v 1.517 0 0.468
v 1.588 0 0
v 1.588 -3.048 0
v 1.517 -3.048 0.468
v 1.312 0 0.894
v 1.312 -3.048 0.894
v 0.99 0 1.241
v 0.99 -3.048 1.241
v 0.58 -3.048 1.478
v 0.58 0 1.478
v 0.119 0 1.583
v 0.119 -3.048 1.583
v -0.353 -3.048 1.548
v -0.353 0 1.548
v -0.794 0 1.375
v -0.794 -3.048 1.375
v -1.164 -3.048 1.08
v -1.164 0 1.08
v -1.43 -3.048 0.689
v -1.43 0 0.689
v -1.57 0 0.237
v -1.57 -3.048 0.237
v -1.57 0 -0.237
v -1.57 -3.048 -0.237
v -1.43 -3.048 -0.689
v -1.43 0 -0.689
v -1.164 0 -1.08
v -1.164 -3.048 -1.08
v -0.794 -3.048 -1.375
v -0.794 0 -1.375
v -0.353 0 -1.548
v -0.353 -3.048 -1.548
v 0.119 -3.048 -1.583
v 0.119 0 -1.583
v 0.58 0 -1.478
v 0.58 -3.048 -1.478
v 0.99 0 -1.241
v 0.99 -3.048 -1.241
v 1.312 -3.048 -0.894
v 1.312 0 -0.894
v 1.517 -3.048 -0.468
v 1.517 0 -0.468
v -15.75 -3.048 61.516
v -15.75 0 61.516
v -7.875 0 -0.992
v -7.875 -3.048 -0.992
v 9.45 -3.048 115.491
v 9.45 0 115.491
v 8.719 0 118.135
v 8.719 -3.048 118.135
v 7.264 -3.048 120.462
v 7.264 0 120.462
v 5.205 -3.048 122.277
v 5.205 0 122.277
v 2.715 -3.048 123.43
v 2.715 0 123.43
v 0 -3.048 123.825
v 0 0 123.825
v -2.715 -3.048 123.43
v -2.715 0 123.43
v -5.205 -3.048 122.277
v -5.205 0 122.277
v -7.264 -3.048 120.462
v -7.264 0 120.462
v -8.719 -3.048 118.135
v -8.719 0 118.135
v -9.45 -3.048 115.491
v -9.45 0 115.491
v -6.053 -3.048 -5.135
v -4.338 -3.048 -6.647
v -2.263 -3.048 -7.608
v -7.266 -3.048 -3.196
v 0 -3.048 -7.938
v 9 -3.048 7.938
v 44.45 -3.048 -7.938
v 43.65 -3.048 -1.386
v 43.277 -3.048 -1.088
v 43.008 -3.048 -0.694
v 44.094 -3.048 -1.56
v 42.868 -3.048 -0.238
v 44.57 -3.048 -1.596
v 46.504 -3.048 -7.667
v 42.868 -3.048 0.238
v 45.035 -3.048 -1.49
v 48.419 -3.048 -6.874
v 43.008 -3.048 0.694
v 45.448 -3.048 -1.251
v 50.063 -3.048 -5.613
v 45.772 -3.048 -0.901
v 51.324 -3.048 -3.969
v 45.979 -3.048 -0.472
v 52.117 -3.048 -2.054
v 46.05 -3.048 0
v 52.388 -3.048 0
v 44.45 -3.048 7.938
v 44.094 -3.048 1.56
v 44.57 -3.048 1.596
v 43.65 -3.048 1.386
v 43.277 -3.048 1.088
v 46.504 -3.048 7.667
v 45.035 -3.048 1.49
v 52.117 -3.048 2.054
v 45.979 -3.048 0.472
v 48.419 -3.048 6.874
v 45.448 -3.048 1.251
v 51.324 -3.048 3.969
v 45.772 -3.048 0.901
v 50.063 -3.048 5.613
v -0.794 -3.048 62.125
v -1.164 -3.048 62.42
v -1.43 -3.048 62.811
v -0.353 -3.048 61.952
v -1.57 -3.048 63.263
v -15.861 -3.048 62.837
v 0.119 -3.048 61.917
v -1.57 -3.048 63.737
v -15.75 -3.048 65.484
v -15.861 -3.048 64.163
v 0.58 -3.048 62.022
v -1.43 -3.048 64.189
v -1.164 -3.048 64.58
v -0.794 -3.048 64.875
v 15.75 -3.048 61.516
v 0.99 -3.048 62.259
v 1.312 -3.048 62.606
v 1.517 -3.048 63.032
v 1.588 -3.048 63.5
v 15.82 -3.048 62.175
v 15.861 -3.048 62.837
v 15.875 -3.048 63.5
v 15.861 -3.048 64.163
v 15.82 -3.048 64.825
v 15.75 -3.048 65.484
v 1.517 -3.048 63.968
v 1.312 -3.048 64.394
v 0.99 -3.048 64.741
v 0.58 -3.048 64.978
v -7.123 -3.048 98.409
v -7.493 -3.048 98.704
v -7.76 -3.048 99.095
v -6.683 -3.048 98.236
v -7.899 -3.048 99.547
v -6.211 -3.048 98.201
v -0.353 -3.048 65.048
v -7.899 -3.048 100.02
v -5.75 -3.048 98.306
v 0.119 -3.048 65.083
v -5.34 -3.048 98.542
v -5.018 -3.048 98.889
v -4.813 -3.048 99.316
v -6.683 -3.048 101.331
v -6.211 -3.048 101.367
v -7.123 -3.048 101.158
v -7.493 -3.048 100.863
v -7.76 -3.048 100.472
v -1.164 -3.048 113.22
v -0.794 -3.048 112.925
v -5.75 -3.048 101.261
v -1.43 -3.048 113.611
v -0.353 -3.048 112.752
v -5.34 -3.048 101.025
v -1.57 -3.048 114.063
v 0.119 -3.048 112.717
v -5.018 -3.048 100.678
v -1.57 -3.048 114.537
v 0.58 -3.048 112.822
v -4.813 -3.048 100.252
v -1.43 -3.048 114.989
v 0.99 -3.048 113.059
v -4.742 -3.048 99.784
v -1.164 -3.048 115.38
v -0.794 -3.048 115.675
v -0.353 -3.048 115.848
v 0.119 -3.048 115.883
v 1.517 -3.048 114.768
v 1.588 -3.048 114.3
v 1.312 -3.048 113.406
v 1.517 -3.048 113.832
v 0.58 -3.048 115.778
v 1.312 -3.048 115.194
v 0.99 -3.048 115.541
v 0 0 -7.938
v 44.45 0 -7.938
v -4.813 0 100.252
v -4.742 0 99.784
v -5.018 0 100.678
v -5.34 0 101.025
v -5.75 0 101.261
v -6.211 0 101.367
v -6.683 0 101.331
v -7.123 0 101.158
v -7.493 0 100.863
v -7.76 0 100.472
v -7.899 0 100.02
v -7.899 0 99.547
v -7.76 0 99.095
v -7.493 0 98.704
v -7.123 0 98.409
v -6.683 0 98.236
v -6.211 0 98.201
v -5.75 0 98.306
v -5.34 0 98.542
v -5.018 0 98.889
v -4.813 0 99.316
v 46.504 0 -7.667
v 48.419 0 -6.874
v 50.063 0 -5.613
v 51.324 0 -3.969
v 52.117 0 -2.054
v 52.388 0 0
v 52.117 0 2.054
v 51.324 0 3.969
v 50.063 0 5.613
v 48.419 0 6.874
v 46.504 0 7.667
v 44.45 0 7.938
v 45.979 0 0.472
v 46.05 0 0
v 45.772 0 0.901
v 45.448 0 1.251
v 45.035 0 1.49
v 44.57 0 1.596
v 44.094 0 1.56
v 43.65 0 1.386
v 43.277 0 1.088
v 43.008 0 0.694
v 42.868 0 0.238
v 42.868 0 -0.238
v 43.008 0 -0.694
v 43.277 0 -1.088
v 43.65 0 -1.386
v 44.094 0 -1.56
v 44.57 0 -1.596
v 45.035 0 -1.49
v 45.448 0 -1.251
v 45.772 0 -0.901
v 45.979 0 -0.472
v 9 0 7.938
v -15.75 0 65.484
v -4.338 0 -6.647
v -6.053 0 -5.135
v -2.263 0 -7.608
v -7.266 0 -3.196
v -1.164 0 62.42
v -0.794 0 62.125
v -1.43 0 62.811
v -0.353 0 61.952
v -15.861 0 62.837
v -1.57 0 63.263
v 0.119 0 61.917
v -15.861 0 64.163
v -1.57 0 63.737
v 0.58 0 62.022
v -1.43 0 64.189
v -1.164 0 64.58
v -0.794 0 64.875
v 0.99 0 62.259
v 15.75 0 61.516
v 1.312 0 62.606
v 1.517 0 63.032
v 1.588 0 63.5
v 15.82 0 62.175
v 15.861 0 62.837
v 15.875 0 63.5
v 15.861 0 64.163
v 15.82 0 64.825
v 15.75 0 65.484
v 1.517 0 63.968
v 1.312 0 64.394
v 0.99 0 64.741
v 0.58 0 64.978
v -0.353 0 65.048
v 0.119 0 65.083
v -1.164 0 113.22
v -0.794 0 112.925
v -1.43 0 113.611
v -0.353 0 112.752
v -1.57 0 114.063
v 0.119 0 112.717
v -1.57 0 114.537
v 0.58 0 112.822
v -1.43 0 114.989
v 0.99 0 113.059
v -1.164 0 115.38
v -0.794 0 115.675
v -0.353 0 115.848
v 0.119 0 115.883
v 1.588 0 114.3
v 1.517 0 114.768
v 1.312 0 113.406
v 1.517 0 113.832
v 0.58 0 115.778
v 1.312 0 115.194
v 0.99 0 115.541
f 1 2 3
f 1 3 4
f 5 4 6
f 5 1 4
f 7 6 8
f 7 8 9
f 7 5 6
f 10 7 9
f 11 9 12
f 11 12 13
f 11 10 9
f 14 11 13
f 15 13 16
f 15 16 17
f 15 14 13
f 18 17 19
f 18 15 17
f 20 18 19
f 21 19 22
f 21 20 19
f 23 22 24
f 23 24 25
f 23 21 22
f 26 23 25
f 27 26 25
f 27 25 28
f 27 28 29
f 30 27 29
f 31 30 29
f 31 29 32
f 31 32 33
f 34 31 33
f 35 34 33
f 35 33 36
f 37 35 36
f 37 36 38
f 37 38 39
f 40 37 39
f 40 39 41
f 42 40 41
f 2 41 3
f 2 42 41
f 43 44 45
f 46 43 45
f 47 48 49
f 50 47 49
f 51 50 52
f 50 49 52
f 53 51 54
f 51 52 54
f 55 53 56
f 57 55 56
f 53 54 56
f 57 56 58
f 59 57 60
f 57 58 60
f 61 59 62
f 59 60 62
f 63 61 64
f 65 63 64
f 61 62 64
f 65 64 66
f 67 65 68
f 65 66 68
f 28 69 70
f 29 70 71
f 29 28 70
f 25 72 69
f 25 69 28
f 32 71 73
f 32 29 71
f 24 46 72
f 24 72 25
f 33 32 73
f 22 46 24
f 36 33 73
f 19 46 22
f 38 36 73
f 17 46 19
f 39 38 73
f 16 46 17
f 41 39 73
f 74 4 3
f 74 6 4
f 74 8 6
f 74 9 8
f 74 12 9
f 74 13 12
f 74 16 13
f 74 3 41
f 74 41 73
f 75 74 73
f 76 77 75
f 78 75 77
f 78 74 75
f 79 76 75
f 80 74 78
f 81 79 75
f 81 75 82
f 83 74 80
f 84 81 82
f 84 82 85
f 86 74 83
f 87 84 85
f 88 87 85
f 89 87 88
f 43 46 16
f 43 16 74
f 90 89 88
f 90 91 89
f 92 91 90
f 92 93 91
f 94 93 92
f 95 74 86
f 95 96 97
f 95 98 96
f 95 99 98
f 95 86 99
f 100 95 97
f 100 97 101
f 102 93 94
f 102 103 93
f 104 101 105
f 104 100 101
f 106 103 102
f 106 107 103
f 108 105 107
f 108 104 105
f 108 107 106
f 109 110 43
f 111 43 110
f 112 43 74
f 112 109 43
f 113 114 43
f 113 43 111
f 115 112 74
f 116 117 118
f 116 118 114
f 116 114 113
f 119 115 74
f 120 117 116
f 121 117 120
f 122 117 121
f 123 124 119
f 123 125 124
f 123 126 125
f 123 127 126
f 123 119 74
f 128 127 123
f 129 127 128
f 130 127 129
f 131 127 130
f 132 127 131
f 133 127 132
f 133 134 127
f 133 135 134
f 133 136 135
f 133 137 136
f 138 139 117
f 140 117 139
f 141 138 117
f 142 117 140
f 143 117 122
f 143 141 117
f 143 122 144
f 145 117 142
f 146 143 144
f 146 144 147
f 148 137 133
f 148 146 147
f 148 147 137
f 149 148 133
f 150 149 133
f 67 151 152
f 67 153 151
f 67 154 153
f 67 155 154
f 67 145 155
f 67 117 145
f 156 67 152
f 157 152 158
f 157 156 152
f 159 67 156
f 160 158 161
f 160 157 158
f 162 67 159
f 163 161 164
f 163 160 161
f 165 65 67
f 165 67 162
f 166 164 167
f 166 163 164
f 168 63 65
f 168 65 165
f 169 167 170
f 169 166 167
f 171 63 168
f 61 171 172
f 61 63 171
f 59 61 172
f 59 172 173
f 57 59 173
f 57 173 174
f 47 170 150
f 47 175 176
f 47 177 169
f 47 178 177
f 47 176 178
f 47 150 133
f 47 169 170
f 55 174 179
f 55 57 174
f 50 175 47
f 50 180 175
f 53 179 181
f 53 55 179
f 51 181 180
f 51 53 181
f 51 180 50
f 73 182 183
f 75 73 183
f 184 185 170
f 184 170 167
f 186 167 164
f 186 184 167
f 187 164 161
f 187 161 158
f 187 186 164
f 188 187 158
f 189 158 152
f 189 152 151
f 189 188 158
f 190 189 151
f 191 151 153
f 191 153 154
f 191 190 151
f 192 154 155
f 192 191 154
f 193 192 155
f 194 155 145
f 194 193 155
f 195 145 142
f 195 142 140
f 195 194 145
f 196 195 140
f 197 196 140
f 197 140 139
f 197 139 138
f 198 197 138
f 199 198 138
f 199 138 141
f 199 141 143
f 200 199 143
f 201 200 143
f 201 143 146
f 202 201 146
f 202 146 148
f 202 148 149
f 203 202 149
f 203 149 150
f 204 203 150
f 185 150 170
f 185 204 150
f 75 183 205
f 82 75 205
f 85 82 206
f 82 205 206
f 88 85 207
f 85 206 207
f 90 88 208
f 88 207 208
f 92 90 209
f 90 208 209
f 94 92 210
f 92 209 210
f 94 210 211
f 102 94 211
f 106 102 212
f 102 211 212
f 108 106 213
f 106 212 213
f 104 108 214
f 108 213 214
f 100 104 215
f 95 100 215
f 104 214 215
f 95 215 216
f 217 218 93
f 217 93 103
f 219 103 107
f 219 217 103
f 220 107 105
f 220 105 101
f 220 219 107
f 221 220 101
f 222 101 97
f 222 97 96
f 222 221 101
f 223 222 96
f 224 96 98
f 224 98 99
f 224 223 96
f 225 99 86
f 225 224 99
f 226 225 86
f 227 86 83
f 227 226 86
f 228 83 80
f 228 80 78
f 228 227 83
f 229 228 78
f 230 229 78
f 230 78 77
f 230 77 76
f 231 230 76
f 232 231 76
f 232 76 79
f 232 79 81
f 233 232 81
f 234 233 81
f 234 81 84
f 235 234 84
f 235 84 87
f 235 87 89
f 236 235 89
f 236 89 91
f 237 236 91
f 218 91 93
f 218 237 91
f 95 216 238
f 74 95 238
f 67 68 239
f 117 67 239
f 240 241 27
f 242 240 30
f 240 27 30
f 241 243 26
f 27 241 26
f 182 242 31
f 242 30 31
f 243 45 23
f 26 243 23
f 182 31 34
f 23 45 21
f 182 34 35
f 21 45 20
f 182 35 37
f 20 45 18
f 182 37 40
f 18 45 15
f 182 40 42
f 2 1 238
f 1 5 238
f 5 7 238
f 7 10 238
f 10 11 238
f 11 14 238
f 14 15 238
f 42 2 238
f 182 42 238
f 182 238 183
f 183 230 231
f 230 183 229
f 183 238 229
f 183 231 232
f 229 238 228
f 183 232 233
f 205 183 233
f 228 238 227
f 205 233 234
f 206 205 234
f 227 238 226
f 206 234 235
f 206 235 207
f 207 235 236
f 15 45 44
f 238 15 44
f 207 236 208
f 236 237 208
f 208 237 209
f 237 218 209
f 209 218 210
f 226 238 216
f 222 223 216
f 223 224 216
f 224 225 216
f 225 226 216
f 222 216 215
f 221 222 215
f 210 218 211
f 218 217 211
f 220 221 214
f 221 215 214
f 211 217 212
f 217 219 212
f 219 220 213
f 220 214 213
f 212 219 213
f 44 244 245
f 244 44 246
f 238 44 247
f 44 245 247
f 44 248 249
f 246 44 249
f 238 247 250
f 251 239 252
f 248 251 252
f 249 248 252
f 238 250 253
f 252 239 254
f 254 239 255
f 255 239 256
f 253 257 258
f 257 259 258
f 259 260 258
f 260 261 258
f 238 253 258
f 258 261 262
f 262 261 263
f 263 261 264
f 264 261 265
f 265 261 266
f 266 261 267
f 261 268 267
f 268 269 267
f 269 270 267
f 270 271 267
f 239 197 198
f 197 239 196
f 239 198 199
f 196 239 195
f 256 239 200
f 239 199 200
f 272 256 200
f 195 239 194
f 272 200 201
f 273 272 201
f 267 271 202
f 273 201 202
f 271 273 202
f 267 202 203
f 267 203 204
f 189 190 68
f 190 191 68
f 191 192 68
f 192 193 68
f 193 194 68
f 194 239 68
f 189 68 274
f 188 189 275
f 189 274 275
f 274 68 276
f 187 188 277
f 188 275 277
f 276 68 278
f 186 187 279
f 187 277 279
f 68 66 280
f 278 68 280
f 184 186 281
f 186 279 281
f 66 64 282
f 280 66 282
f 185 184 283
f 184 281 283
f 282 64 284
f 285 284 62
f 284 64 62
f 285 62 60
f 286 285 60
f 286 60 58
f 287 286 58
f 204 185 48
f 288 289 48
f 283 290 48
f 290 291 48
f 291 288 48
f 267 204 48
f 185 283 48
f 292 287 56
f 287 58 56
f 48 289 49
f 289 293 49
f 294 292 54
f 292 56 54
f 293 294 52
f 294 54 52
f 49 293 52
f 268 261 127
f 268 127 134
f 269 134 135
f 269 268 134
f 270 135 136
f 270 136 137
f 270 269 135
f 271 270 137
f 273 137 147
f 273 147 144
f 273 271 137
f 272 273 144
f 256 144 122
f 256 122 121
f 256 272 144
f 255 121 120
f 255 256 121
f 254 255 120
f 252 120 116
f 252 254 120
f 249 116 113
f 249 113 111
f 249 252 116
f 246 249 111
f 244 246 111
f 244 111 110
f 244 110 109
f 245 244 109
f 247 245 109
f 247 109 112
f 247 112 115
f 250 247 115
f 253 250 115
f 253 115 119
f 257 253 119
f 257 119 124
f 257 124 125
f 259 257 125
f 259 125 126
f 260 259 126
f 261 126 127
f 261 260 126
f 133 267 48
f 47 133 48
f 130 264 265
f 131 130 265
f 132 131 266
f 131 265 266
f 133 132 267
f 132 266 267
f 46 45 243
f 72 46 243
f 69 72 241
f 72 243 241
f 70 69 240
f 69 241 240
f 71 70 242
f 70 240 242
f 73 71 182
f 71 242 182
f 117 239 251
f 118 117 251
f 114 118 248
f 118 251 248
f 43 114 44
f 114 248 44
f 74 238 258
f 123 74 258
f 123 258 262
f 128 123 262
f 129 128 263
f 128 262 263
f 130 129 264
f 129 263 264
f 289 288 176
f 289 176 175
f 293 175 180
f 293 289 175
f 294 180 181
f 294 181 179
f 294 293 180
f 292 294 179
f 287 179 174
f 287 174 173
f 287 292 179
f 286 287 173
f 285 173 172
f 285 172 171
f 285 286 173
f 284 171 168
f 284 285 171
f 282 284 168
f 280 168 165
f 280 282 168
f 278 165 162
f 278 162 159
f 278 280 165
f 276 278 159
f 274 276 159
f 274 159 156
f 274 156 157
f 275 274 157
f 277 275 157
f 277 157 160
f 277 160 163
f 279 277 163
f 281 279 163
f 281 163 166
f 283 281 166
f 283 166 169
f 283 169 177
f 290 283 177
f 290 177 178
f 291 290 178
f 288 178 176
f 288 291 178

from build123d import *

# Parameters (mm, degrees)
F0_R     = 1.5875
F0_R_2   = 1.6002
F1_DEPTH = 3.048
F4_DEPTH = 3.048


# Not quite as in the source:
# - a feature of the source that left no trace in its solid (it failed there, or was rolled back) is left out


with BuildPart() as f1:
    # F0 (on Front) → F1 (new body)
    with BuildSketch(Plane.XZ):
        with BuildLine():
            ThreePointArc((-9.4502929642, 115.490625), (-0.596483242, 104.7936951058), (9.525, 114.3))
            ThreePointArc((9.525, 114.3), (9.5063048942, 114.896483242), (9.4502929642, 115.490625))
            ThreePointArc((9.4502929642, 115.490625), (0, 123.825), (-9.4502929642, 115.490625))
        make_face()
        with Locations((0, 114.3)):
            Circle(F0_R, mode=Mode.SUBTRACT)
        with BuildLine():
            ThreePointArc((9.4502929642, 115.490625), (9.5063048942, 114.896483242), (9.525, 114.3))
            ThreePointArc((9.525, 114.3), (-0.596483242, 104.7936951058), (-9.4502929642, 115.490625))
            Line((-9.4502929642, 115.490625), (-15.7504882737, 65.484375))
            ThreePointArc((-15.7504882737, 65.484375), (0, 79.375), (15.7504882737, 65.484375))
            Line((15.7504882737, 65.484375), (9.4502929642, 115.490625))
        make_face()
        with Locations((-6.3295518048, 99.7836068273)):
            Circle(F0_R, mode=Mode.SUBTRACT)
        with BuildLine():
            ThreePointArc((15.875, 63.5), (15.8438414904, 64.4941387366), (15.7504882737, 65.484375))
            ThreePointArc((15.7504882737, 65.484375), (0, 79.375), (-15.7504882737, 65.484375))
            ThreePointArc((-15.7504882737, 65.484375), (-15.875, 63.5), (-15.7504882737, 61.515625))
            ThreePointArc((-15.7504882737, 61.515625), (0, 47.625), (15.7504882737, 61.515625))
            ThreePointArc((15.7504882737, 61.515625), (15.8438414904, 62.5058612634), (15.875, 63.5))
        make_face()
        with Locations((0, 63.5)):
            Circle(F0_R, mode=Mode.SUBTRACT)
        with BuildLine():
            ThreePointArc((15.7504882737, 61.515625), (0, 47.625), (-15.7504882737, 61.515625))
            Line((-15.7504882737, 61.515625), (-7.8752441368, -0.9921875))
            ThreePointArc((-7.8752441368, -0.9921875), (-5.953125, 5.2501627579), (0, 7.9375))
            Line((0, 7.9375), (9.0002790135, 7.9375))
            Line((9.0002790135, 7.9375), (15.7504882737, 61.515625))
        make_face()
        with BuildLine():
            ThreePointArc((0, 7.9375), (-5.953125, 5.2501627579), (-7.8752441368, -0.9921875))
            ThreePointArc((-7.8752441368, -0.9921875), (-5.2501627579, -5.953125), (0, -7.9375))
            ThreePointArc((0, -7.9375), (5.2501627579, -5.953125), (7.8752441368, -0.9921875))
            ThreePointArc((7.8752441368, -0.9921875), (7.9219207452, -0.4970693683), (7.9375, 0))
            ThreePointArc((7.9375, 0), (5.6126600757, 5.6126600757), (0, 7.9375))
        make_face()
        Circle(F0_R, mode=Mode.SUBTRACT)
        with BuildLine():
            Line((7.8752441368, -0.9921875), (9.0002790135, 7.9375))
            Line((9.0002790135, 7.9375), (0, 7.9375))
            ThreePointArc((0, 7.9375), (5.6126600757, 5.6126600757), (7.9375, 0))
            ThreePointArc((7.9375, 0), (7.9219207452, -0.4970693683), (7.8752441368, -0.9921875))
        make_face()
        with BuildLine():
            Line((44.45, 7.9375), (9.0002790135, 7.9375))
            Line((9.0002790135, 7.9375), (7.8752441368, -0.9921875))
            ThreePointArc((7.8752441368, -0.9921875), (5.2501627579, -5.953125), (0, -7.9375))
            Line((0, -7.9375), (44.45, -7.9375))
            ThreePointArc((44.45, -7.9375), (36.5125, 0), (44.45, 7.9375))
        make_face()
        with BuildLine():
            ThreePointArc((52.3875, 0), (50.0626600757, 5.6126600757), (44.45, 7.9375))
            ThreePointArc((44.45, 7.9375), (36.5125, 0), (44.45, -7.9375))
            ThreePointArc((44.45, -7.9375), (50.0626600757, -5.6126600757), (52.3875, 0))
        make_face()
        with Locations((44.45, 0)):
            Circle(F0_R_2, mode=Mode.SUBTRACT)
    extrude(amount=F1_DEPTH)


with BuildPart() as f4:
    # F0 (on Front) → F4 (new body)
    with BuildSketch(Plane.XZ):
        with BuildLine():
            ThreePointArc((-9.4502929642, 115.490625), (-0.596483242, 104.7936951058), (9.525, 114.3))
            ThreePointArc((9.525, 114.3), (9.5063048942, 114.896483242), (9.4502929642, 115.490625))
            ThreePointArc((9.4502929642, 115.490625), (0, 123.825), (-9.4502929642, 115.490625))
        make_face()
        with Locations((0, 114.3)):
            Circle(F0_R, mode=Mode.SUBTRACT)
        with BuildLine():
            ThreePointArc((9.4502929642, 115.490625), (9.5063048942, 114.896483242), (9.525, 114.3))
            ThreePointArc((9.525, 114.3), (-0.596483242, 104.7936951058), (-9.4502929642, 115.490625))
            Line((-9.4502929642, 115.490625), (-15.7504882737, 65.484375))
            ThreePointArc((-15.7504882737, 65.484375), (0, 79.375), (15.7504882737, 65.484375))
            Line((15.7504882737, 65.484375), (9.4502929642, 115.490625))
        make_face()
        with Locations((-6.3295518048, 99.7836068273)):
            Circle(F0_R, mode=Mode.SUBTRACT)
        with BuildLine():
            ThreePointArc((15.875, 63.5), (15.8438414904, 64.4941387366), (15.7504882737, 65.484375))
            ThreePointArc((15.7504882737, 65.484375), (0, 79.375), (-15.7504882737, 65.484375))
            ThreePointArc((-15.7504882737, 65.484375), (-15.875, 63.5), (-15.7504882737, 61.515625))
            ThreePointArc((-15.7504882737, 61.515625), (0, 47.625), (15.7504882737, 61.515625))
            ThreePointArc((15.7504882737, 61.515625), (15.8438414904, 62.5058612634), (15.875, 63.5))
        make_face()
        with Locations((0, 63.5)):
            Circle(F0_R, mode=Mode.SUBTRACT)
        with BuildLine():
            ThreePointArc((15.7504882737, 61.515625), (0, 47.625), (-15.7504882737, 61.515625))
            Line((-15.7504882737, 61.515625), (-7.8752441368, -0.9921875))
            ThreePointArc((-7.8752441368, -0.9921875), (-5.953125, 5.2501627579), (0, 7.9375))
            Line((0, 7.9375), (9.0002790135, 7.9375))
            Line((9.0002790135, 7.9375), (15.7504882737, 61.515625))
        make_face()
        with BuildLine():
            ThreePointArc((0, 7.9375), (-5.953125, 5.2501627579), (-7.8752441368, -0.9921875))
            ThreePointArc((-7.8752441368, -0.9921875), (-5.2501627579, -5.953125), (0, -7.9375))
            ThreePointArc((0, -7.9375), (5.2501627579, -5.953125), (7.8752441368, -0.9921875))
            ThreePointArc((7.8752441368, -0.9921875), (7.9219207452, -0.4970693683), (7.9375, 0))
            ThreePointArc((7.9375, 0), (5.6126600757, 5.6126600757), (0, 7.9375))
        make_face()
        Circle(F0_R, mode=Mode.SUBTRACT)
        with BuildLine():
            Line((7.8752441368, -0.9921875), (9.0002790135, 7.9375))
            Line((9.0002790135, 7.9375), (0, 7.9375))
            ThreePointArc((0, 7.9375), (5.6126600757, 5.6126600757), (7.9375, 0))
            ThreePointArc((7.9375, 0), (7.9219207452, -0.4970693683), (7.8752441368, -0.9921875))
        make_face()
        with BuildLine():
            Line((44.45, 7.9375), (9.0002790135, 7.9375))
            Line((9.0002790135, 7.9375), (7.8752441368, -0.9921875))
            ThreePointArc((7.8752441368, -0.9921875), (5.2501627579, -5.953125), (0, -7.9375))
            Line((0, -7.9375), (44.45, -7.9375))
            ThreePointArc((44.45, -7.9375), (36.5125, 0), (44.45, 7.9375))
        make_face()
        with BuildLine():
            ThreePointArc((52.3875, 0), (50.0626600757, 5.6126600757), (44.45, 7.9375))
            ThreePointArc((44.45, 7.9375), (36.5125, 0), (44.45, -7.9375))
            ThreePointArc((44.45, -7.9375), (50.0626600757, -5.6126600757), (52.3875, 0))
        make_face()
        with Locations((44.45, 0)):
            Circle(F0_R_2, mode=Mode.SUBTRACT)
    extrude(amount=F4_DEPTH)


solid = f4.part
